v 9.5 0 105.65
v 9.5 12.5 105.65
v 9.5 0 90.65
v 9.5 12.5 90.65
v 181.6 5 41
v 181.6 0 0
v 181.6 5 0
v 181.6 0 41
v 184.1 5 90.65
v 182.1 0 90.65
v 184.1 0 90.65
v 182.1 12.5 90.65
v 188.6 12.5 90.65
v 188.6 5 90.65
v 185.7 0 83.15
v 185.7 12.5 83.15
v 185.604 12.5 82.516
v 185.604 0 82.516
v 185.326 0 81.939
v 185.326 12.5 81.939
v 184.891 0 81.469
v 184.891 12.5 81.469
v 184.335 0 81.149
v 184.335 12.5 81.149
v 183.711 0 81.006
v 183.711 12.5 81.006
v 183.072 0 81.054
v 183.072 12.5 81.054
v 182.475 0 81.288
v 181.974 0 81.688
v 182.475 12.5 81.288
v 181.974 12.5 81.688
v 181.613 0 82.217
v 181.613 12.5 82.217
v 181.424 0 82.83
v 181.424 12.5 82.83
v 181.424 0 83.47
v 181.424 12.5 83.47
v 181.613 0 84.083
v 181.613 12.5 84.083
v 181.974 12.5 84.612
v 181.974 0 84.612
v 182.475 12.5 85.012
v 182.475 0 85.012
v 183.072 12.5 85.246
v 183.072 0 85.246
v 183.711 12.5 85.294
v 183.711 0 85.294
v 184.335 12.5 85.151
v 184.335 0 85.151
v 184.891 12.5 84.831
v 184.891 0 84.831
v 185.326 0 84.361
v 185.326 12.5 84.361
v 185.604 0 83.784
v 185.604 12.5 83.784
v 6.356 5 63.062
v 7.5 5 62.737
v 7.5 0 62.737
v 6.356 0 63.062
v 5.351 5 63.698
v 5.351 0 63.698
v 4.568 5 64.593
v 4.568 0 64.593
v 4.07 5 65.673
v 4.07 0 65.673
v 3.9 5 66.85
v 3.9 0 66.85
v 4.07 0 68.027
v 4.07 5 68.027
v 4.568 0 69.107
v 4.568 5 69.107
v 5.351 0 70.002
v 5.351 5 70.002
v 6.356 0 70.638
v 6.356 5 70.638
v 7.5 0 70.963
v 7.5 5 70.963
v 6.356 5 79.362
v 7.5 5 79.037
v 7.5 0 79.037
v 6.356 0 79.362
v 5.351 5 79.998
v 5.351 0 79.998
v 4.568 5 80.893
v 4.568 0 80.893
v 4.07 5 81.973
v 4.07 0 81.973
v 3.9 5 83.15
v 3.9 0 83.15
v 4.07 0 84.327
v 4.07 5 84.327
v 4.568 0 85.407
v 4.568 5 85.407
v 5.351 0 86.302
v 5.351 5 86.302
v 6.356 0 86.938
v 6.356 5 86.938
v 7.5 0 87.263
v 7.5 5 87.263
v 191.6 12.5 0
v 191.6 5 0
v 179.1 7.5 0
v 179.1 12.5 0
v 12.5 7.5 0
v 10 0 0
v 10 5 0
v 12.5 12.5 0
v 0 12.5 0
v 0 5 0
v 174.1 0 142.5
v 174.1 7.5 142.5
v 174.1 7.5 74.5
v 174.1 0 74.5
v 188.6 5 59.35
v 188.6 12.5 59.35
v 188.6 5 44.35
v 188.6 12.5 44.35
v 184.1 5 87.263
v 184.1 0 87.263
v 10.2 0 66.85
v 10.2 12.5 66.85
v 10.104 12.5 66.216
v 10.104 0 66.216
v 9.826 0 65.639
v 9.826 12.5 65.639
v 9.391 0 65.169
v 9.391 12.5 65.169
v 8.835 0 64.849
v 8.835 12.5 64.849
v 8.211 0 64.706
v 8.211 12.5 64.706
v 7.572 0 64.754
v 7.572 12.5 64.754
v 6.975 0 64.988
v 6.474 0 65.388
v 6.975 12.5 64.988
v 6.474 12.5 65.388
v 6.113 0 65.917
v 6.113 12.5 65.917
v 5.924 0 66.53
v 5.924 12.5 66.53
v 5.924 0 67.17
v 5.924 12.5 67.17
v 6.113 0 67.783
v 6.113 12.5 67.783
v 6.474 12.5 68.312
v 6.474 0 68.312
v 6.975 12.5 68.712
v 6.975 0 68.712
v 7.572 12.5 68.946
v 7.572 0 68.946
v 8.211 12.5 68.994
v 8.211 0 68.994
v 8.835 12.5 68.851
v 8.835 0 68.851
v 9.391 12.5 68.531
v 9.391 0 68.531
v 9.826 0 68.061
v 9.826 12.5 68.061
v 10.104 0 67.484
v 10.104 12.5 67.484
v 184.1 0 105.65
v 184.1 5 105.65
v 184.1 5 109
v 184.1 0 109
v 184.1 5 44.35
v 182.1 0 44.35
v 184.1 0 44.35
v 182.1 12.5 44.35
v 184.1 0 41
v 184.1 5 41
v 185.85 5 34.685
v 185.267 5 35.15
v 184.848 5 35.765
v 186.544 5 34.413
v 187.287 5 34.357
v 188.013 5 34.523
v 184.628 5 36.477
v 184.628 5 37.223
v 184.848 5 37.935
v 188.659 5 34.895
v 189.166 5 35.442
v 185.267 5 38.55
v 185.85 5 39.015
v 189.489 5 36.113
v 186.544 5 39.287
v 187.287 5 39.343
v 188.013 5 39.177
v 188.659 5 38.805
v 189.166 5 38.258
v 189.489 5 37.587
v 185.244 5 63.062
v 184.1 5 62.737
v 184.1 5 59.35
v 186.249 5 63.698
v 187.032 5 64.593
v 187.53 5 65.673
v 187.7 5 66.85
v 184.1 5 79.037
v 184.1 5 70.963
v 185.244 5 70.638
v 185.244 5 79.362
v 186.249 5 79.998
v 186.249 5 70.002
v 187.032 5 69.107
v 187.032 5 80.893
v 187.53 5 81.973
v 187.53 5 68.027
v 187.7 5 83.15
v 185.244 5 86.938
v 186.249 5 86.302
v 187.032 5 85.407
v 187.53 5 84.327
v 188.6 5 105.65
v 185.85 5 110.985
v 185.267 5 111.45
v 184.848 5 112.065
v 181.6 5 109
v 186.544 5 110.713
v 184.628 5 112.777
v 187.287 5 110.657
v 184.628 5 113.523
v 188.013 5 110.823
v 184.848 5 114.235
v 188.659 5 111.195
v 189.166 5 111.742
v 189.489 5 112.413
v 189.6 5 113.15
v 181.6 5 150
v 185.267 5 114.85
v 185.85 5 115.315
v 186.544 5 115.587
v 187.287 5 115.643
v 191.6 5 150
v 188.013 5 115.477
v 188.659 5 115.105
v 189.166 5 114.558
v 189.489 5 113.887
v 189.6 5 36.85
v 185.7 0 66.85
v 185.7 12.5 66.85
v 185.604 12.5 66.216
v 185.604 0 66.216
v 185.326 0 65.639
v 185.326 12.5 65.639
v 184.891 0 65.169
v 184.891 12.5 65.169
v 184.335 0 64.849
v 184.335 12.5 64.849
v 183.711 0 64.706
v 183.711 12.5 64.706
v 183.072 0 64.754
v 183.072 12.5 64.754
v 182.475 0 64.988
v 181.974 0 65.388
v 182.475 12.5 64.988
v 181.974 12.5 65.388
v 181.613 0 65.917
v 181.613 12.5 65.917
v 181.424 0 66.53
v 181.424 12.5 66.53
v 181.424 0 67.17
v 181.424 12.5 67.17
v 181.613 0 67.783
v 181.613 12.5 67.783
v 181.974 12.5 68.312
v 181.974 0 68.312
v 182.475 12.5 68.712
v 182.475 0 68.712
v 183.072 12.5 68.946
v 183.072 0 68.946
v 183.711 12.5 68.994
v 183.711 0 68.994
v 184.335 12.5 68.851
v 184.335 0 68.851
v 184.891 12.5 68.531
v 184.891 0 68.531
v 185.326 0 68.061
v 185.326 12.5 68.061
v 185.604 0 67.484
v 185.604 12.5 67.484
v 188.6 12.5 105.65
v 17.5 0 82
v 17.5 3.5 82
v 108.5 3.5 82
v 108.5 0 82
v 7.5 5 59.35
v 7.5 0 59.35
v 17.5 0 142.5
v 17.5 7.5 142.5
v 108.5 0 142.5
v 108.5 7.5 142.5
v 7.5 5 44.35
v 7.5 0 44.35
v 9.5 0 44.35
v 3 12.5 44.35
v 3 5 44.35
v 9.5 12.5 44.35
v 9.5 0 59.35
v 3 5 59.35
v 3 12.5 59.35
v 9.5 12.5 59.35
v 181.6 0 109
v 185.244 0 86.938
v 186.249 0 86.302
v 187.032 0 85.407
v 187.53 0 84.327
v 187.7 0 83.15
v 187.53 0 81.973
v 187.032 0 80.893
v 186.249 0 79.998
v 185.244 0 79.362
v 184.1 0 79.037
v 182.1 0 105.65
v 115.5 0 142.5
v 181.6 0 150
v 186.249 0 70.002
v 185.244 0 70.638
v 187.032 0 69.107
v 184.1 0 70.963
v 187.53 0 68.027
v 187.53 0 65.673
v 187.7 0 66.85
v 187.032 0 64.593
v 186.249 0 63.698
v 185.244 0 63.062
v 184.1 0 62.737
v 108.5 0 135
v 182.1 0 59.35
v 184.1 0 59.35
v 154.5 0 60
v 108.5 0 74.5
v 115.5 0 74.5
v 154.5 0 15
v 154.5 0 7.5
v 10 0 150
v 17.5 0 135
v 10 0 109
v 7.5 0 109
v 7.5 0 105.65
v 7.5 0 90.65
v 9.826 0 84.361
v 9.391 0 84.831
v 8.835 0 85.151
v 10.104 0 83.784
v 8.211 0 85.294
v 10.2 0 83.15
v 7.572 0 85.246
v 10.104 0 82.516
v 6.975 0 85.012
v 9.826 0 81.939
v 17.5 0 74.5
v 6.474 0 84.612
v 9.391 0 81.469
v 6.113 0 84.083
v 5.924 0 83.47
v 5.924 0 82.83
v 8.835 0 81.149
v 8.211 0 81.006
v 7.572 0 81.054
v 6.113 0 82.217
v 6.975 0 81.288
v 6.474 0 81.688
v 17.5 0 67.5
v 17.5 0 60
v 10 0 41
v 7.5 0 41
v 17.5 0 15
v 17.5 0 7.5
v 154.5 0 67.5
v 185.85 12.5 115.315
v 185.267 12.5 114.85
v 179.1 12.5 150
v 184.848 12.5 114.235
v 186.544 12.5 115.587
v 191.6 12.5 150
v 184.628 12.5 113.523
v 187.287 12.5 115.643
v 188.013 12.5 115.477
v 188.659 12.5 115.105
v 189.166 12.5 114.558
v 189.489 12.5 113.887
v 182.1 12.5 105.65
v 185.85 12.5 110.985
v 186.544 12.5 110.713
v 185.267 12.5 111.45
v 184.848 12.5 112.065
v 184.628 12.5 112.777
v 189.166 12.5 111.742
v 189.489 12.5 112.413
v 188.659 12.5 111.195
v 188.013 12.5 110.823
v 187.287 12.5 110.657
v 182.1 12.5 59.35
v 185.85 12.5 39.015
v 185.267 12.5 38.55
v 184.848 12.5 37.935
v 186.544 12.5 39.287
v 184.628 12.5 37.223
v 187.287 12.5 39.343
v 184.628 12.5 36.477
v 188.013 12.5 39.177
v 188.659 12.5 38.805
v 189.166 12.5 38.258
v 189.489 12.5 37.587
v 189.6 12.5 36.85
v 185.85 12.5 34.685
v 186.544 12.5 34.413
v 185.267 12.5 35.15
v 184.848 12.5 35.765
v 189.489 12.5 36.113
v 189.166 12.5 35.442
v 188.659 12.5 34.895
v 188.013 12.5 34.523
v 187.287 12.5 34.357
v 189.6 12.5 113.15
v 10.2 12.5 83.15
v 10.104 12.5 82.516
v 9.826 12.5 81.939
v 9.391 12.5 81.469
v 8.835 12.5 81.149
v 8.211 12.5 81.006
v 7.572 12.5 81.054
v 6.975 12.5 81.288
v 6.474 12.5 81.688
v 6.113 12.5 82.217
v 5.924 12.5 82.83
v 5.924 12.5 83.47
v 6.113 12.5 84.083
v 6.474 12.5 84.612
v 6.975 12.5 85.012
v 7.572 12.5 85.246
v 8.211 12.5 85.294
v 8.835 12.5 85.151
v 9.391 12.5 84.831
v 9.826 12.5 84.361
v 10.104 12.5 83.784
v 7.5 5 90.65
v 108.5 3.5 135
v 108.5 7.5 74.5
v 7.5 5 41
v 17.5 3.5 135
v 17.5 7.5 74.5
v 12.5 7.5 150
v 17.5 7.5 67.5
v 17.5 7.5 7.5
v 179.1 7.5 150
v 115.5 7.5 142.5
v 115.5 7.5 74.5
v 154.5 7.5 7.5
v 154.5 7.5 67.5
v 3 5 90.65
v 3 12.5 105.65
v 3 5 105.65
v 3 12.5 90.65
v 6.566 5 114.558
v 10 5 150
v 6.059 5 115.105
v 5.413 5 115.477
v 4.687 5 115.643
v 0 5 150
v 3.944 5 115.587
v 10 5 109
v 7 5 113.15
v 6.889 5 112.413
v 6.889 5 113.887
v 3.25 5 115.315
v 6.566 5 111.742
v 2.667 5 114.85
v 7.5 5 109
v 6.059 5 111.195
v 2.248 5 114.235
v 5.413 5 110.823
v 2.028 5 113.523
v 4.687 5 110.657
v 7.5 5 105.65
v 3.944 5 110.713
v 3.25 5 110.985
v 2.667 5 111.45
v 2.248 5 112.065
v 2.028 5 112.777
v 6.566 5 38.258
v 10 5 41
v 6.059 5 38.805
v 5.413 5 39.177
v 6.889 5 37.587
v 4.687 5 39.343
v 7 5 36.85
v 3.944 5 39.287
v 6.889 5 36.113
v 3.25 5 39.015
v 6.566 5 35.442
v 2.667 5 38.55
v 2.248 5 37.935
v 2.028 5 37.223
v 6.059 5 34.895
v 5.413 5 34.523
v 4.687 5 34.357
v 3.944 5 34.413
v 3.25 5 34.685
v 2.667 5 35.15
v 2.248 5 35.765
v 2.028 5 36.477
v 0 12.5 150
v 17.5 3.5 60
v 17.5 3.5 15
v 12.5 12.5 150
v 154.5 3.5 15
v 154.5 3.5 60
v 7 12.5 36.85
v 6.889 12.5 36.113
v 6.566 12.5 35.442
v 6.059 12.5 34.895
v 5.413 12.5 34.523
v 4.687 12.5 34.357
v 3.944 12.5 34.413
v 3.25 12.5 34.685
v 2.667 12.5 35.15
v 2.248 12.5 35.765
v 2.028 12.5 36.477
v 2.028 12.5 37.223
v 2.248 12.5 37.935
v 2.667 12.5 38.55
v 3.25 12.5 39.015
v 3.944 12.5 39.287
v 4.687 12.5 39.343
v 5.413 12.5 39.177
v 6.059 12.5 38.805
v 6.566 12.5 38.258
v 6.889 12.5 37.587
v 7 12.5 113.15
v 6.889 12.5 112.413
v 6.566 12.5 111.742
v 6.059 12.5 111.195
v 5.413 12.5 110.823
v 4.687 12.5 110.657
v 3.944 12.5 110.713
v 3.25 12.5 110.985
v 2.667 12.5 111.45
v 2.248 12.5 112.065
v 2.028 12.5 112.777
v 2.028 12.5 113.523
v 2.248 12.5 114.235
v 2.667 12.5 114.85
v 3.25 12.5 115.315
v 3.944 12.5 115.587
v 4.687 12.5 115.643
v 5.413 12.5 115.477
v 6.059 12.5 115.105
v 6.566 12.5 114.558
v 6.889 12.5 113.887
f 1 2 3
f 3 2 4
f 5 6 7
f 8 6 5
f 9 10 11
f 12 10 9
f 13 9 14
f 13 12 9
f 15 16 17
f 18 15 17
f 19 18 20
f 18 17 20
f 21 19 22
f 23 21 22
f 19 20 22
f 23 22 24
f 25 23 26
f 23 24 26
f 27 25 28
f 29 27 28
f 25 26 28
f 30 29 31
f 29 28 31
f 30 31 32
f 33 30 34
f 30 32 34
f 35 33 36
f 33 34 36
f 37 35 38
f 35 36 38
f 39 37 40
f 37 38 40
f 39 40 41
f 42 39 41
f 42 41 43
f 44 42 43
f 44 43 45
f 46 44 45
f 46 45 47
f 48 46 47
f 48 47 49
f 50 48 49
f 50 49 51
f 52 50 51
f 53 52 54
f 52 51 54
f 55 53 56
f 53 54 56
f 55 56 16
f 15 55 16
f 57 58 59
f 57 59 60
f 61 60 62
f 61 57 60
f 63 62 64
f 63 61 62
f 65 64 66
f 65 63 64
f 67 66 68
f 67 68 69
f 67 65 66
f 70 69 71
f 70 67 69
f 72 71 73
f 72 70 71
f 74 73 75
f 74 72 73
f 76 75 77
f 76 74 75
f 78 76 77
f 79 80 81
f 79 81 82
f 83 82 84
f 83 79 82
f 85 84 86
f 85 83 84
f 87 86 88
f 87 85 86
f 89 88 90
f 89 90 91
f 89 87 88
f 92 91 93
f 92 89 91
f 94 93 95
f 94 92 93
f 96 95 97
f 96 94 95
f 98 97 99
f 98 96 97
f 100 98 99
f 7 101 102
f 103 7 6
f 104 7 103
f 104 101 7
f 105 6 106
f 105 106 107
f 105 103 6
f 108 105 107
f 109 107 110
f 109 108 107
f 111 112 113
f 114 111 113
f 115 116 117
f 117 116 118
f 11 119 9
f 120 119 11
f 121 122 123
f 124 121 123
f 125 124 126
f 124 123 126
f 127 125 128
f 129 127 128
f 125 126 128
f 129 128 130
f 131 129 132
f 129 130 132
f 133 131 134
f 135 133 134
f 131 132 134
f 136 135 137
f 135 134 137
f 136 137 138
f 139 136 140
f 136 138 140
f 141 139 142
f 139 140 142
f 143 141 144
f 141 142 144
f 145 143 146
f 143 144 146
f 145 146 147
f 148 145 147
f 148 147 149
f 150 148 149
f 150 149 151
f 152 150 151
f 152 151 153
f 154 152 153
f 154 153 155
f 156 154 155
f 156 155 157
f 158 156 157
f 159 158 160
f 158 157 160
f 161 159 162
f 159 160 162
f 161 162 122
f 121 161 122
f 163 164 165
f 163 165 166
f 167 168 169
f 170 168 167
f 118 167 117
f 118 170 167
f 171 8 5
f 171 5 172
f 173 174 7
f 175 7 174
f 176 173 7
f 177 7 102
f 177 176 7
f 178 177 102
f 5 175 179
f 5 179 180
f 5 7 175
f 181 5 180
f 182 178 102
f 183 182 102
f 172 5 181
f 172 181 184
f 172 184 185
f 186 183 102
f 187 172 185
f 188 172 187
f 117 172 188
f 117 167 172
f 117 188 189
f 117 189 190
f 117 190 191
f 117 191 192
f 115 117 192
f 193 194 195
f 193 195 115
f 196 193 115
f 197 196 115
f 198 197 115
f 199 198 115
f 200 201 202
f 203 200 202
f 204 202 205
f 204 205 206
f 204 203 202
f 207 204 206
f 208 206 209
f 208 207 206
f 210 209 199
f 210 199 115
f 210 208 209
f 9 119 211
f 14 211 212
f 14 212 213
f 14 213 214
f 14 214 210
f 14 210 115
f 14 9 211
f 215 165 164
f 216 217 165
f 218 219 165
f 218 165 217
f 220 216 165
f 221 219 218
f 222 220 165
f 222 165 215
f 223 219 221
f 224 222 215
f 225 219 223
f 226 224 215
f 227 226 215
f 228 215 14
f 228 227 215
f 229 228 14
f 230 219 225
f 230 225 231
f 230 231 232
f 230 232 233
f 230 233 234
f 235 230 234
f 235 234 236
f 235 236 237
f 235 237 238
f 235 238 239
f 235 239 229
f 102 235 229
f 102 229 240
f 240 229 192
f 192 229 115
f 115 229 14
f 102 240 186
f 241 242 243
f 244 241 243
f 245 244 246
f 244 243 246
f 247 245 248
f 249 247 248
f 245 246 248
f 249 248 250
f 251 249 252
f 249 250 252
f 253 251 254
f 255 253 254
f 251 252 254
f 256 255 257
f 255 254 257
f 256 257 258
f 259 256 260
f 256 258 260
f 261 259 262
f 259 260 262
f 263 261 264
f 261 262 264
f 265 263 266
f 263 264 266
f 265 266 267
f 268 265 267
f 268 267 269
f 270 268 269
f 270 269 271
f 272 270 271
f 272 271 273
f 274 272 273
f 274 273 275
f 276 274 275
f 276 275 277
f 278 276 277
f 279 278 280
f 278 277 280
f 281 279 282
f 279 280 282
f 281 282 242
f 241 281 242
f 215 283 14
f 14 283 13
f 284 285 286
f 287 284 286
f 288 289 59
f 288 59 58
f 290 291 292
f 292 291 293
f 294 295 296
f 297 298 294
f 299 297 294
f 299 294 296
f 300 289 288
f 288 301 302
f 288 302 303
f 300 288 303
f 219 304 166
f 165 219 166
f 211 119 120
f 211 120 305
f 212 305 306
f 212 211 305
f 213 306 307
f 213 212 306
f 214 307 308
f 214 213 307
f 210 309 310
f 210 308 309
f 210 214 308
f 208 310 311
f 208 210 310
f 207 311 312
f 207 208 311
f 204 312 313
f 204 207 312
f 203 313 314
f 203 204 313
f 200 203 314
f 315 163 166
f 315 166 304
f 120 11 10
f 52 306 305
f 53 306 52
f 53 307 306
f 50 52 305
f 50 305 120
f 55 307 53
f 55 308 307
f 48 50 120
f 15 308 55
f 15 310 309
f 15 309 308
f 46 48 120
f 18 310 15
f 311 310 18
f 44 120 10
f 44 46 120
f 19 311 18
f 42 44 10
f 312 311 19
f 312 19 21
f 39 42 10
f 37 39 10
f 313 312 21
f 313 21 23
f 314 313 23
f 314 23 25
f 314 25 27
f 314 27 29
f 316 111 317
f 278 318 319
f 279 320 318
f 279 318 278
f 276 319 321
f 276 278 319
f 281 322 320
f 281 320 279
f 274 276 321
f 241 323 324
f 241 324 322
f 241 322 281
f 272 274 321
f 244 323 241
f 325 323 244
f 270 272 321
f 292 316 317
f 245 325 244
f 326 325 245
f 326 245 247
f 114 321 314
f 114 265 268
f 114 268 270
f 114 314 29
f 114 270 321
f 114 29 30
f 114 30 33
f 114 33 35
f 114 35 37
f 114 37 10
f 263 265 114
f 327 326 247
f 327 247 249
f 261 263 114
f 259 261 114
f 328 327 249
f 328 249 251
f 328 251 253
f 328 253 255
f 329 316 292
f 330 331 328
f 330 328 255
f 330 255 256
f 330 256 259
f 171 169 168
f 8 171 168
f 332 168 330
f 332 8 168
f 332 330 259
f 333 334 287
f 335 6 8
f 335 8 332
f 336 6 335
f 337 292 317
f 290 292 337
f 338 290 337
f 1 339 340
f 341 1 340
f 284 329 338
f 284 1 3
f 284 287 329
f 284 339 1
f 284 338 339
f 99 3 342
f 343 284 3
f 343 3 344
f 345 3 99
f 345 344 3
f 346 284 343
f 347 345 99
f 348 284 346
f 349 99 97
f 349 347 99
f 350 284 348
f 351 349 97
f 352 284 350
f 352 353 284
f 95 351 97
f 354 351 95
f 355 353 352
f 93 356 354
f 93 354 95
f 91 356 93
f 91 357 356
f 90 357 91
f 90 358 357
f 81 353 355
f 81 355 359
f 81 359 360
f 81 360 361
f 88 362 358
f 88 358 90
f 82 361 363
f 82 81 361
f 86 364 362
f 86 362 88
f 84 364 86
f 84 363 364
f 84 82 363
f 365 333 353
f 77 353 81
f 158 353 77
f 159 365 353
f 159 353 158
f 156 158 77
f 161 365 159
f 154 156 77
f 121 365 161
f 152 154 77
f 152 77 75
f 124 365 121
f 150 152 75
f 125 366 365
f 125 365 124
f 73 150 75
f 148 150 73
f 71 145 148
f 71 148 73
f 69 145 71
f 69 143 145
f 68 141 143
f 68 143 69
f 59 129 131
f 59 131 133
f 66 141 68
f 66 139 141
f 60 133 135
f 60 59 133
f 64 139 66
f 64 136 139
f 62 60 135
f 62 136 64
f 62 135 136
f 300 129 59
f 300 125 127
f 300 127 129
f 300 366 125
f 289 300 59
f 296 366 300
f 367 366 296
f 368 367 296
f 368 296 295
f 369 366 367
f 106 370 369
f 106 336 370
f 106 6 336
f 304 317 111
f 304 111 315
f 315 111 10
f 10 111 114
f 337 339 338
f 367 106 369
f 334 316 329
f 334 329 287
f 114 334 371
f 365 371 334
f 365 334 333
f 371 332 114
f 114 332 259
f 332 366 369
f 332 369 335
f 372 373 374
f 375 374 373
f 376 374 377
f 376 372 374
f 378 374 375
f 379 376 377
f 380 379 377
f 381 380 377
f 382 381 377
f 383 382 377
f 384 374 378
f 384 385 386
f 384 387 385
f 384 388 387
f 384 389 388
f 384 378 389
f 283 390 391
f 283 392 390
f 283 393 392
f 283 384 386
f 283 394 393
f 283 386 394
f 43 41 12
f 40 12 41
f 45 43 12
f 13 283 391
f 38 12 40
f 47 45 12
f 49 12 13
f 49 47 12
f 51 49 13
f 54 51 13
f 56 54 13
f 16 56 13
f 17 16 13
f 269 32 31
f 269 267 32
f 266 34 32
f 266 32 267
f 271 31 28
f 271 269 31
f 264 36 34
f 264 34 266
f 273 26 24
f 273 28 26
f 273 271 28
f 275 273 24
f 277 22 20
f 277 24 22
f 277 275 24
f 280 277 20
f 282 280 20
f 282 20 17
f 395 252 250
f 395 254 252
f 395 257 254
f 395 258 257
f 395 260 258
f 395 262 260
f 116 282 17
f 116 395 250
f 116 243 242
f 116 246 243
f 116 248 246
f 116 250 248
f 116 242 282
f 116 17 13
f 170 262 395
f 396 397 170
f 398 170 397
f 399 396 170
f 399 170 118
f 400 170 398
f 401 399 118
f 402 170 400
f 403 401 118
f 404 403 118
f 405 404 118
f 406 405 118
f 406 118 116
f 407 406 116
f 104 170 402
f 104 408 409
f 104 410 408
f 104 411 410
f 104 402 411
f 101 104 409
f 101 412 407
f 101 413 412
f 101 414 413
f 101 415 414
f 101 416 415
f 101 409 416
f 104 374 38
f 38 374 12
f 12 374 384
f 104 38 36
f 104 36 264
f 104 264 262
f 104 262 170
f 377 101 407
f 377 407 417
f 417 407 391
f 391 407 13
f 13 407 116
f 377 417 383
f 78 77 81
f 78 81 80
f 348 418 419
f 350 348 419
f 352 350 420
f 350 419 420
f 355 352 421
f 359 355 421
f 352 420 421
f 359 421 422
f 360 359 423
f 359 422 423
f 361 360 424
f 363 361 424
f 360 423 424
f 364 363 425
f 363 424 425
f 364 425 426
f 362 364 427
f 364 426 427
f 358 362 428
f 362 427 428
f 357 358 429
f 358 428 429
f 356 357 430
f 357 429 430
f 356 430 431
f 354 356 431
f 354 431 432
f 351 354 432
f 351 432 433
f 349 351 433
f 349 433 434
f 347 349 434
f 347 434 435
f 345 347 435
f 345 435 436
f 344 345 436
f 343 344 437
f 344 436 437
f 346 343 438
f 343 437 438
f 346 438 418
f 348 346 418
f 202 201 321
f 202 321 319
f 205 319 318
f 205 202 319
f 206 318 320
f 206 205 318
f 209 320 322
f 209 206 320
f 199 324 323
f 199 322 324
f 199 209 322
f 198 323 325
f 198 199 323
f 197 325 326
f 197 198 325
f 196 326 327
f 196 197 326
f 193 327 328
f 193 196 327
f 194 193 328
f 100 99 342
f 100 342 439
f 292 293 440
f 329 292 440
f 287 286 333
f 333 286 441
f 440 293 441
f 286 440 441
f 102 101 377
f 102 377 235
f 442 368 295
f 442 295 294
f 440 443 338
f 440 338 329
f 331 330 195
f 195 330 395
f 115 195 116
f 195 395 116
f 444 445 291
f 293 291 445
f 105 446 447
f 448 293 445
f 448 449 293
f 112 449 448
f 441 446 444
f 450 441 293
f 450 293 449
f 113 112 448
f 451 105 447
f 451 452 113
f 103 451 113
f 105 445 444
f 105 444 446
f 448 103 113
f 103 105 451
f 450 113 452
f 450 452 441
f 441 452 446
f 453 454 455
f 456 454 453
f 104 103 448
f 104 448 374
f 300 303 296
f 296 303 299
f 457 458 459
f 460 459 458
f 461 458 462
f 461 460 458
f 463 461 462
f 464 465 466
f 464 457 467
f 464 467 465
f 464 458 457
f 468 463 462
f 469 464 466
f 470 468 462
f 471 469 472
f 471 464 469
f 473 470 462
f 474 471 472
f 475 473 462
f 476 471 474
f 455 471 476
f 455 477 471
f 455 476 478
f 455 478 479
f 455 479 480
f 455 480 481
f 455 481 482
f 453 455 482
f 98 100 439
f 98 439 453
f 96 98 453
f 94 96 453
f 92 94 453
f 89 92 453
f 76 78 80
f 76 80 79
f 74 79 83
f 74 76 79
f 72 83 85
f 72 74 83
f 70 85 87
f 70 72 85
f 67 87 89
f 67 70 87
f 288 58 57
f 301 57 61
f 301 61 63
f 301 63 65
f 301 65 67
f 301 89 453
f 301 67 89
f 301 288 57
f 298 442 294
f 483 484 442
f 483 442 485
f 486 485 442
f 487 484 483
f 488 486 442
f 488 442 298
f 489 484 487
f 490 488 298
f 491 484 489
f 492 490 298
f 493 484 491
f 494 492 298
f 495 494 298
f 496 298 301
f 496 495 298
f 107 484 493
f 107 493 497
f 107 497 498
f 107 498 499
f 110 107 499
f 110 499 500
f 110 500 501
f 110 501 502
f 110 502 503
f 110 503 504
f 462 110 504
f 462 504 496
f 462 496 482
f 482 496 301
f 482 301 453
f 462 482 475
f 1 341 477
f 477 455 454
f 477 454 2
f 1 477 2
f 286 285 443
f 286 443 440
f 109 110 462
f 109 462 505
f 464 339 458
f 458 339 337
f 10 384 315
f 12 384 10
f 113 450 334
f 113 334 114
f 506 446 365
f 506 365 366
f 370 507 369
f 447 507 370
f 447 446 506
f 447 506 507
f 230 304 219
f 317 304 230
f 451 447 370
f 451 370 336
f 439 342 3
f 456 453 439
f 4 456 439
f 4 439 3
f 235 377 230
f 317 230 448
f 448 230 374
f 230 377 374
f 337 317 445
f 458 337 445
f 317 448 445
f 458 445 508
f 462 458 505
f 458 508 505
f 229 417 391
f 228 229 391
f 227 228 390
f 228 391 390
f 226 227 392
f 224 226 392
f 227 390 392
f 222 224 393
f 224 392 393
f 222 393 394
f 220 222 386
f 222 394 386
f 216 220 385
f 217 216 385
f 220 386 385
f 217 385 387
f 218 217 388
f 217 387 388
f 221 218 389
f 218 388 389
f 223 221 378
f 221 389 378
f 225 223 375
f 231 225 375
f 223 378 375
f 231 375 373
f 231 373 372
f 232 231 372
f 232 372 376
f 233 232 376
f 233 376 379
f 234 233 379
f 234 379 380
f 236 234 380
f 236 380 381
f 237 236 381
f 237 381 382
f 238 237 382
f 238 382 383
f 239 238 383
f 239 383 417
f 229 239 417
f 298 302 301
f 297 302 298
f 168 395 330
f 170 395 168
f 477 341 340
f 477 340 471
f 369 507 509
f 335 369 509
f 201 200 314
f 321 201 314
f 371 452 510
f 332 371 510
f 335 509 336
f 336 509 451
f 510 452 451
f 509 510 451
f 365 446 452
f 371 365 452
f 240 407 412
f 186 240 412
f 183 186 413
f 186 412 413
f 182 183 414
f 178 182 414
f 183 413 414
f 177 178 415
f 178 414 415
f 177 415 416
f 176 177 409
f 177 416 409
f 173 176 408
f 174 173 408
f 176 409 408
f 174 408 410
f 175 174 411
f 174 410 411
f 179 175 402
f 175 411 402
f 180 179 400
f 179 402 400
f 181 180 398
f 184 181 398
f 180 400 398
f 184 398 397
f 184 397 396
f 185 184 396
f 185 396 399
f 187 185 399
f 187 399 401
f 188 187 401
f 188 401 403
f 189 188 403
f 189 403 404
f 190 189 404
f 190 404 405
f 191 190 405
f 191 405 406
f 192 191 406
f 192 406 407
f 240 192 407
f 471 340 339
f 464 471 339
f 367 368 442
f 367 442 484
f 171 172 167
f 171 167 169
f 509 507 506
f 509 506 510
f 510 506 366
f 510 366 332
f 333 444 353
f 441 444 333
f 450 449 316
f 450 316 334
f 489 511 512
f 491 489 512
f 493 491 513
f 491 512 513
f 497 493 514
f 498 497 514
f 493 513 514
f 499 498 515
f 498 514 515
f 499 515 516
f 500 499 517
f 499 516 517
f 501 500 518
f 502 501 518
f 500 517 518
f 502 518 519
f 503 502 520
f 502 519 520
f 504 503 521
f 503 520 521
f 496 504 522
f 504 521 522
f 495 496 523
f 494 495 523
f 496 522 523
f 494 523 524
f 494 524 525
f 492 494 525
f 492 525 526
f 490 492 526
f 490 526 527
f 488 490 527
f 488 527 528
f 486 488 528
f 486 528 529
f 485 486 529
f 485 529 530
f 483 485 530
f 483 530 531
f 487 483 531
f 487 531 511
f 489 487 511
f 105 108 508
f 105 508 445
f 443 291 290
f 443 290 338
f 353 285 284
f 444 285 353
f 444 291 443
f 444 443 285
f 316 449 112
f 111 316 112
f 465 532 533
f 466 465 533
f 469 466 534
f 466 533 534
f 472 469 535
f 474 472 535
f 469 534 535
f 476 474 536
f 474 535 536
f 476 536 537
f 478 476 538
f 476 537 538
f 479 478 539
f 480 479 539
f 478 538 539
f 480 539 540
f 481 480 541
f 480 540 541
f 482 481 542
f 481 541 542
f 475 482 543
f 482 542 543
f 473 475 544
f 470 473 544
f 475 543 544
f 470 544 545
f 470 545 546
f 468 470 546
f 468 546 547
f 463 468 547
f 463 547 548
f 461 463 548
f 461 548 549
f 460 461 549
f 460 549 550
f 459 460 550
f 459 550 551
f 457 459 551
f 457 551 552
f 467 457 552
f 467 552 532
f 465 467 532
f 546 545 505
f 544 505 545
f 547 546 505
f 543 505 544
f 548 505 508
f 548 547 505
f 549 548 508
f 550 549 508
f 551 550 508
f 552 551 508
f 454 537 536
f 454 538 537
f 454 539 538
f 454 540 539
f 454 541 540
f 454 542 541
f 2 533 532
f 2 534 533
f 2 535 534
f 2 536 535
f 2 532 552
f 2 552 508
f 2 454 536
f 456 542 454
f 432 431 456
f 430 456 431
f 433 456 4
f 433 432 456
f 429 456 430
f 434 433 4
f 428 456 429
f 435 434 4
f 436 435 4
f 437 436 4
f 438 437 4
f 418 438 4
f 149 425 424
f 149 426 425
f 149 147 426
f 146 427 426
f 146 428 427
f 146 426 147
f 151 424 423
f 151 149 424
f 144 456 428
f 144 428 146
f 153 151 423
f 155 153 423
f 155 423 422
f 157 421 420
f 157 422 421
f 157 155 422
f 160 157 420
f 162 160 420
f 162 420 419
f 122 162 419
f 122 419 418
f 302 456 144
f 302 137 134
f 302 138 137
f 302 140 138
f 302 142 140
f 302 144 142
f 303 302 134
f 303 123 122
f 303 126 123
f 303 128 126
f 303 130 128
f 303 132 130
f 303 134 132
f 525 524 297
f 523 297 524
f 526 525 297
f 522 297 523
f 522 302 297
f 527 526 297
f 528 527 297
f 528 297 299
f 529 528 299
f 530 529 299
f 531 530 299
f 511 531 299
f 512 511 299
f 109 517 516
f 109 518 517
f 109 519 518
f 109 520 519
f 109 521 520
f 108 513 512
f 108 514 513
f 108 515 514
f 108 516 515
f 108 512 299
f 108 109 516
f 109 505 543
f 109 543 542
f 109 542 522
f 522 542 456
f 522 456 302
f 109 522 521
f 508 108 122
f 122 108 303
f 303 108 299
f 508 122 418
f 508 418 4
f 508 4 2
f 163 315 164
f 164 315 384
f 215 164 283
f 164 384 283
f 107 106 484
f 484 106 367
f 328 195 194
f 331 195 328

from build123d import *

# Parameters (mm, degrees)
PLATEFRAME_DEPTH          = 150
SKETCH3_R                 = 2.5
HOLESUPPORT_DEPTH         = 13.5
SKETCH4_R                 = 4.15
SKETCH4_R_2               = 2.15
CYLINDRICALSUPPORTS_DEPTH = 12.5
SKETCH8_W                 = 137
SKETCH8_H                 = 60
SKETCH8_W_2               = 91
SKETCH8_H_2               = 68
ITEMLAYOUT_DEPTH          = 4
SKETCH9_W                 = 58.6
SKETCH9_H                 = 68
HOLECUTOUT_DEPTH          = 7.5
SKETCH10_W                = 91
SKETCH10_H                = 7.5
SKETCH10_W_2              = 137
VELCROCUT_DEPTH           = 3.5
SKETCH11_W                = 6.5
SKETCH11_H                = 15
CUTSHELLHOLES_DEPTH       = 12.5
SKETCH12_R                = 2.5
STANDOFFHOLES_DEPTH       = 13.5
SKETCH13_W                = 2.5
SKETCH13_H                = 41
CUTSTANDOFFROOM_DEPTH     = 5


with BuildPart() as part:
    # Sketch2 → PlateFrame (new body)
    with BuildSketch(Plane.XY):
        Polygon((179.1, 12.5), (191.6, 12.5), (191.6, 5), (184.1, 5), (184.1, 0), (7.5, 0), (7.5, 5), (0, 5), (0, 12.5), (12.5, 12.5), (12.5, 7.5), (179.1, 7.5), align=None)
    extrude(amount=PLATEFRAME_DEPTH)

    # Sketch3 → HoleSupport (cut, through all)
    with BuildSketch(Plane(origin=(0, 12.5, 0), x_dir=(1, 0, 0), z_dir=(0, 1, 0))):
        with Locations((8.05, -66.85)):
            Circle(SKETCH3_R)
        with Locations((8.05, -83.15)):
            Circle(SKETCH3_R)
        with Locations((183.55, -66.85)):
            Circle(SKETCH3_R)
        with Locations((183.55, -83.15)):
            Circle(SKETCH3_R)
    extrude(amount=-HOLESUPPORT_DEPTH, mode=Mode.SUBTRACT)

    # Sketch4 → CylindricalSupports (add)
    with BuildSketch(Plane(origin=(0, 12.5, 0), x_dir=(1, 0, 0), z_dir=(0, 1, 0))):
        with Locations((183.55, -66.85)):
            Circle(SKETCH4_R)
        with Locations((183.55, -66.85)):
            Circle(SKETCH4_R_2, mode=Mode.SUBTRACT)
        with Locations((183.55, -83.15)):
            Circle(SKETCH4_R)
        with Locations((183.55, -83.15)):
            Circle(SKETCH4_R_2, mode=Mode.SUBTRACT)
        with Locations((8.05, -66.85)):
            Circle(SKETCH4_R)
        with Locations((8.05, -66.85)):
            Circle(SKETCH4_R_2, mode=Mode.SUBTRACT)
        with Locations((8.05, -83.15)):
            Circle(SKETCH4_R)
        with Locations((8.05, -83.15)):
            Circle(SKETCH4_R_2, mode=Mode.SUBTRACT)
    extrude(amount=-CYLINDRICALSUPPORTS_DEPTH)

    # Sketch8 → ItemLayout (cut)
    with BuildSketch(Plane(origin=(0, 7.5, 0), x_dir=(1, 0, 0), z_dir=(0, 1, 0))):
        with Locations((86, -37.5)):
            Rectangle(SKETCH8_W, SKETCH8_H)
        with Locations((63, -108.5)):
            Rectangle(SKETCH8_W_2, SKETCH8_H_2)
    extrude(amount=-ITEMLAYOUT_DEPTH, mode=Mode.SUBTRACT)

    # Sketch9 → HoleCutout (cut)
    with BuildSketch(Plane(origin=(0, 7.5, 0), x_dir=(1, 0, 0), z_dir=(0, 1, 0))):
        with Locations((144.8, -108.5)):
            Rectangle(SKETCH9_W, SKETCH9_H)
    extrude(amount=-HOLECUTOUT_DEPTH, mode=Mode.SUBTRACT)

    # Sketch10 → VelcroCut (cut)
    with BuildSketch(Plane(origin=(0, 3.5, 0), x_dir=(1, 0, 0), z_dir=(0, 1, 0))):
        with Locations((63, -78.25)):
            Rectangle(SKETCH10_W, SKETCH10_H)
        with Locations((63, -138.75)):
            Rectangle(SKETCH10_W, SKETCH10_H)
        with Locations((86, -11.25)):
            Rectangle(SKETCH10_W_2, SKETCH10_H)
        with Locations((86, -63.75)):
            Rectangle(SKETCH10_W_2, SKETCH10_H)
    extrude(amount=-VELCROCUT_DEPTH, mode=Mode.SUBTRACT)

    # Sketch11 → CutShellHoles (cut)
    with BuildSketch(Plane(origin=(0, 12.5, 0), x_dir=(1, 0, 0), z_dir=(0, 1, 0))):
        with Locations((6.25, -51.85)):
            Rectangle(SKETCH11_W, SKETCH11_H)
        with Locations((185.35, -51.85)):
            Rectangle(SKETCH11_W, SKETCH11_H)
        with Locations((185.35, -98.15)):
            Rectangle(SKETCH11_W, SKETCH11_H)
        with Locations((6.25, -98.15)):
            Rectangle(SKETCH11_W, SKETCH11_H)
    extrude(amount=-CUTSHELLHOLES_DEPTH, mode=Mode.SUBTRACT)

    # Sketch12 → StandoffHoles (cut, through all)
    with BuildSketch(Plane(origin=(0, 12.5, 0), x_dir=(1, 0, 0), z_dir=(0, 1, 0))):
        with Locations((4.5, -36.85)):
            Circle(SKETCH12_R)
        with Locations((4.5, -113.15)):
            Circle(SKETCH12_R)
        with Locations((187.1, -36.85)):
            Circle(SKETCH12_R)
        with Locations((187.1, -113.15)):
            Circle(SKETCH12_R)
    extrude(amount=-STANDOFFHOLES_DEPTH, mode=Mode.SUBTRACT)

    # Sketch13 → CutStandoffRoom (cut)
    with BuildSketch(Plane.XZ):
        with Locations((8.75, 20.5)):
            Rectangle(SKETCH13_W, SKETCH13_H)
        with Locations((8.75, 129.5)):
            Rectangle(SKETCH13_W, SKETCH13_H)
        with Locations((182.85, 129.5)):
            Rectangle(SKETCH13_W, SKETCH13_H)
        with Locations((182.85, 20.5)):
            Rectangle(SKETCH13_W, SKETCH13_H)
    extrude(amount=-CUTSTANDOFFROOM_DEPTH, mode=Mode.SUBTRACT)


solid = part.part
